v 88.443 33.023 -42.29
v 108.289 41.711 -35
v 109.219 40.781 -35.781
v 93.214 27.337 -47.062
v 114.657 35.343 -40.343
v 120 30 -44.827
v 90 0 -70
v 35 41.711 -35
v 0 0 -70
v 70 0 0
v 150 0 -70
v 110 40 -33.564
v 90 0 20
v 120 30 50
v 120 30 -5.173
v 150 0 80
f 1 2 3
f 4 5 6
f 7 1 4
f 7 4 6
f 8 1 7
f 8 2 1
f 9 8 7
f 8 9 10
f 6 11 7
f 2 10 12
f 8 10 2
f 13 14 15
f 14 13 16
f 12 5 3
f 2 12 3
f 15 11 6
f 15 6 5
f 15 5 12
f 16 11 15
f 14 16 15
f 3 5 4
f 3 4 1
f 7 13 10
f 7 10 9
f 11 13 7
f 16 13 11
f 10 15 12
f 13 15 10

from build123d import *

# Parameters (mm, degrees)
SURFACESAB_DEPTH        = 150
SURFACESCD_DEPTH        = 80
SURFACESCD_DEPTH_BACK   = 70
CUT_EXTRUDE3_DEPTH      = 42.711375741
SURFACEE_DEPTH          = 130
CUT_EXTRUDE9_DEPTH      = 81
CUT_EXTRUDE9_DEPTH_BACK = 71
CUT_EXTRUDE10_DEPTH     = 150


with BuildPart() as part:
    # Sketch2 → SurfacesAB (new body)
    with BuildSketch(Plane(origin=(0, 0, 0), x_dir=(0, 0, -1), z_dir=(1, 0, 0))):
        Polygon((0, 0), (35, 41.711375741), (70, 0), align=None)
    extrude(amount=SURFACESAB_DEPTH)

    # Sketch3 → SurfacesCD (add, two sides)
    with BuildSketch(Plane.XY) as surfacescd_sk:
        Polygon((150, 0), (120, 30), (90, 0), align=None)
    extrude(amount=SURFACESCD_DEPTH)
    extrude(surfacescd_sk.sketch, amount=-SURFACESCD_DEPTH_BACK)

    # Sketch6 → Cut-Extrude3 (cut, through all)
    with BuildSketch(Plane(origin=(0, 0, 0), x_dir=(1, 0, 0), z_dir=(0, 1, 0))):
        Polygon((0, 70), (150, -80), (0, -80), align=None)
    extrude(amount=CUT_EXTRUDE3_DEPTH, mode=Mode.SUBTRACT)

    # Sketch13 → SurfaceE (add)
    with BuildSketch(Plane(origin=(150, 0, 80), x_dir=(-0.707106781, 0, 0.707106781), z_dir=(-0.707106781, 0, -0.707106781))):
        Polygon((0, 0), (-14.142135624, 0), (-79.799705645, 50.488741568), (-80.104771591, 61.598214949), align=None)
    extrude(amount=SURFACEE_DEPTH)

    # Sketch10 → Cut-Extrude9 (cut, two sides)
    with BuildSketch(Plane.XY) as cut_extrude9_sk:
        Polygon((150, 0), (83.43213667, 66.56786333), (150, 66.56786333), (213.23579194, 66.56786333), (213.23579194, 0), align=None)
    extrude(amount=CUT_EXTRUDE9_DEPTH, mode=Mode.SUBTRACT)
    extrude(cut_extrude9_sk.sketch, amount=-CUT_EXTRUDE9_DEPTH_BACK, mode=Mode.SUBTRACT)

    # Sketch4 → Cut-Extrude10 (cut)
    with BuildSketch(Plane(origin=(150, 0, 0), x_dir=(0, 0, -1), z_dir=(1, 0, 0))):
        Polygon((70, 0), (18.686100405, 61.153524192), (70, 61.153524192), align=None)
    extrude(amount=-CUT_EXTRUDE10_DEPTH, mode=Mode.SUBTRACT)


solid = part.part
